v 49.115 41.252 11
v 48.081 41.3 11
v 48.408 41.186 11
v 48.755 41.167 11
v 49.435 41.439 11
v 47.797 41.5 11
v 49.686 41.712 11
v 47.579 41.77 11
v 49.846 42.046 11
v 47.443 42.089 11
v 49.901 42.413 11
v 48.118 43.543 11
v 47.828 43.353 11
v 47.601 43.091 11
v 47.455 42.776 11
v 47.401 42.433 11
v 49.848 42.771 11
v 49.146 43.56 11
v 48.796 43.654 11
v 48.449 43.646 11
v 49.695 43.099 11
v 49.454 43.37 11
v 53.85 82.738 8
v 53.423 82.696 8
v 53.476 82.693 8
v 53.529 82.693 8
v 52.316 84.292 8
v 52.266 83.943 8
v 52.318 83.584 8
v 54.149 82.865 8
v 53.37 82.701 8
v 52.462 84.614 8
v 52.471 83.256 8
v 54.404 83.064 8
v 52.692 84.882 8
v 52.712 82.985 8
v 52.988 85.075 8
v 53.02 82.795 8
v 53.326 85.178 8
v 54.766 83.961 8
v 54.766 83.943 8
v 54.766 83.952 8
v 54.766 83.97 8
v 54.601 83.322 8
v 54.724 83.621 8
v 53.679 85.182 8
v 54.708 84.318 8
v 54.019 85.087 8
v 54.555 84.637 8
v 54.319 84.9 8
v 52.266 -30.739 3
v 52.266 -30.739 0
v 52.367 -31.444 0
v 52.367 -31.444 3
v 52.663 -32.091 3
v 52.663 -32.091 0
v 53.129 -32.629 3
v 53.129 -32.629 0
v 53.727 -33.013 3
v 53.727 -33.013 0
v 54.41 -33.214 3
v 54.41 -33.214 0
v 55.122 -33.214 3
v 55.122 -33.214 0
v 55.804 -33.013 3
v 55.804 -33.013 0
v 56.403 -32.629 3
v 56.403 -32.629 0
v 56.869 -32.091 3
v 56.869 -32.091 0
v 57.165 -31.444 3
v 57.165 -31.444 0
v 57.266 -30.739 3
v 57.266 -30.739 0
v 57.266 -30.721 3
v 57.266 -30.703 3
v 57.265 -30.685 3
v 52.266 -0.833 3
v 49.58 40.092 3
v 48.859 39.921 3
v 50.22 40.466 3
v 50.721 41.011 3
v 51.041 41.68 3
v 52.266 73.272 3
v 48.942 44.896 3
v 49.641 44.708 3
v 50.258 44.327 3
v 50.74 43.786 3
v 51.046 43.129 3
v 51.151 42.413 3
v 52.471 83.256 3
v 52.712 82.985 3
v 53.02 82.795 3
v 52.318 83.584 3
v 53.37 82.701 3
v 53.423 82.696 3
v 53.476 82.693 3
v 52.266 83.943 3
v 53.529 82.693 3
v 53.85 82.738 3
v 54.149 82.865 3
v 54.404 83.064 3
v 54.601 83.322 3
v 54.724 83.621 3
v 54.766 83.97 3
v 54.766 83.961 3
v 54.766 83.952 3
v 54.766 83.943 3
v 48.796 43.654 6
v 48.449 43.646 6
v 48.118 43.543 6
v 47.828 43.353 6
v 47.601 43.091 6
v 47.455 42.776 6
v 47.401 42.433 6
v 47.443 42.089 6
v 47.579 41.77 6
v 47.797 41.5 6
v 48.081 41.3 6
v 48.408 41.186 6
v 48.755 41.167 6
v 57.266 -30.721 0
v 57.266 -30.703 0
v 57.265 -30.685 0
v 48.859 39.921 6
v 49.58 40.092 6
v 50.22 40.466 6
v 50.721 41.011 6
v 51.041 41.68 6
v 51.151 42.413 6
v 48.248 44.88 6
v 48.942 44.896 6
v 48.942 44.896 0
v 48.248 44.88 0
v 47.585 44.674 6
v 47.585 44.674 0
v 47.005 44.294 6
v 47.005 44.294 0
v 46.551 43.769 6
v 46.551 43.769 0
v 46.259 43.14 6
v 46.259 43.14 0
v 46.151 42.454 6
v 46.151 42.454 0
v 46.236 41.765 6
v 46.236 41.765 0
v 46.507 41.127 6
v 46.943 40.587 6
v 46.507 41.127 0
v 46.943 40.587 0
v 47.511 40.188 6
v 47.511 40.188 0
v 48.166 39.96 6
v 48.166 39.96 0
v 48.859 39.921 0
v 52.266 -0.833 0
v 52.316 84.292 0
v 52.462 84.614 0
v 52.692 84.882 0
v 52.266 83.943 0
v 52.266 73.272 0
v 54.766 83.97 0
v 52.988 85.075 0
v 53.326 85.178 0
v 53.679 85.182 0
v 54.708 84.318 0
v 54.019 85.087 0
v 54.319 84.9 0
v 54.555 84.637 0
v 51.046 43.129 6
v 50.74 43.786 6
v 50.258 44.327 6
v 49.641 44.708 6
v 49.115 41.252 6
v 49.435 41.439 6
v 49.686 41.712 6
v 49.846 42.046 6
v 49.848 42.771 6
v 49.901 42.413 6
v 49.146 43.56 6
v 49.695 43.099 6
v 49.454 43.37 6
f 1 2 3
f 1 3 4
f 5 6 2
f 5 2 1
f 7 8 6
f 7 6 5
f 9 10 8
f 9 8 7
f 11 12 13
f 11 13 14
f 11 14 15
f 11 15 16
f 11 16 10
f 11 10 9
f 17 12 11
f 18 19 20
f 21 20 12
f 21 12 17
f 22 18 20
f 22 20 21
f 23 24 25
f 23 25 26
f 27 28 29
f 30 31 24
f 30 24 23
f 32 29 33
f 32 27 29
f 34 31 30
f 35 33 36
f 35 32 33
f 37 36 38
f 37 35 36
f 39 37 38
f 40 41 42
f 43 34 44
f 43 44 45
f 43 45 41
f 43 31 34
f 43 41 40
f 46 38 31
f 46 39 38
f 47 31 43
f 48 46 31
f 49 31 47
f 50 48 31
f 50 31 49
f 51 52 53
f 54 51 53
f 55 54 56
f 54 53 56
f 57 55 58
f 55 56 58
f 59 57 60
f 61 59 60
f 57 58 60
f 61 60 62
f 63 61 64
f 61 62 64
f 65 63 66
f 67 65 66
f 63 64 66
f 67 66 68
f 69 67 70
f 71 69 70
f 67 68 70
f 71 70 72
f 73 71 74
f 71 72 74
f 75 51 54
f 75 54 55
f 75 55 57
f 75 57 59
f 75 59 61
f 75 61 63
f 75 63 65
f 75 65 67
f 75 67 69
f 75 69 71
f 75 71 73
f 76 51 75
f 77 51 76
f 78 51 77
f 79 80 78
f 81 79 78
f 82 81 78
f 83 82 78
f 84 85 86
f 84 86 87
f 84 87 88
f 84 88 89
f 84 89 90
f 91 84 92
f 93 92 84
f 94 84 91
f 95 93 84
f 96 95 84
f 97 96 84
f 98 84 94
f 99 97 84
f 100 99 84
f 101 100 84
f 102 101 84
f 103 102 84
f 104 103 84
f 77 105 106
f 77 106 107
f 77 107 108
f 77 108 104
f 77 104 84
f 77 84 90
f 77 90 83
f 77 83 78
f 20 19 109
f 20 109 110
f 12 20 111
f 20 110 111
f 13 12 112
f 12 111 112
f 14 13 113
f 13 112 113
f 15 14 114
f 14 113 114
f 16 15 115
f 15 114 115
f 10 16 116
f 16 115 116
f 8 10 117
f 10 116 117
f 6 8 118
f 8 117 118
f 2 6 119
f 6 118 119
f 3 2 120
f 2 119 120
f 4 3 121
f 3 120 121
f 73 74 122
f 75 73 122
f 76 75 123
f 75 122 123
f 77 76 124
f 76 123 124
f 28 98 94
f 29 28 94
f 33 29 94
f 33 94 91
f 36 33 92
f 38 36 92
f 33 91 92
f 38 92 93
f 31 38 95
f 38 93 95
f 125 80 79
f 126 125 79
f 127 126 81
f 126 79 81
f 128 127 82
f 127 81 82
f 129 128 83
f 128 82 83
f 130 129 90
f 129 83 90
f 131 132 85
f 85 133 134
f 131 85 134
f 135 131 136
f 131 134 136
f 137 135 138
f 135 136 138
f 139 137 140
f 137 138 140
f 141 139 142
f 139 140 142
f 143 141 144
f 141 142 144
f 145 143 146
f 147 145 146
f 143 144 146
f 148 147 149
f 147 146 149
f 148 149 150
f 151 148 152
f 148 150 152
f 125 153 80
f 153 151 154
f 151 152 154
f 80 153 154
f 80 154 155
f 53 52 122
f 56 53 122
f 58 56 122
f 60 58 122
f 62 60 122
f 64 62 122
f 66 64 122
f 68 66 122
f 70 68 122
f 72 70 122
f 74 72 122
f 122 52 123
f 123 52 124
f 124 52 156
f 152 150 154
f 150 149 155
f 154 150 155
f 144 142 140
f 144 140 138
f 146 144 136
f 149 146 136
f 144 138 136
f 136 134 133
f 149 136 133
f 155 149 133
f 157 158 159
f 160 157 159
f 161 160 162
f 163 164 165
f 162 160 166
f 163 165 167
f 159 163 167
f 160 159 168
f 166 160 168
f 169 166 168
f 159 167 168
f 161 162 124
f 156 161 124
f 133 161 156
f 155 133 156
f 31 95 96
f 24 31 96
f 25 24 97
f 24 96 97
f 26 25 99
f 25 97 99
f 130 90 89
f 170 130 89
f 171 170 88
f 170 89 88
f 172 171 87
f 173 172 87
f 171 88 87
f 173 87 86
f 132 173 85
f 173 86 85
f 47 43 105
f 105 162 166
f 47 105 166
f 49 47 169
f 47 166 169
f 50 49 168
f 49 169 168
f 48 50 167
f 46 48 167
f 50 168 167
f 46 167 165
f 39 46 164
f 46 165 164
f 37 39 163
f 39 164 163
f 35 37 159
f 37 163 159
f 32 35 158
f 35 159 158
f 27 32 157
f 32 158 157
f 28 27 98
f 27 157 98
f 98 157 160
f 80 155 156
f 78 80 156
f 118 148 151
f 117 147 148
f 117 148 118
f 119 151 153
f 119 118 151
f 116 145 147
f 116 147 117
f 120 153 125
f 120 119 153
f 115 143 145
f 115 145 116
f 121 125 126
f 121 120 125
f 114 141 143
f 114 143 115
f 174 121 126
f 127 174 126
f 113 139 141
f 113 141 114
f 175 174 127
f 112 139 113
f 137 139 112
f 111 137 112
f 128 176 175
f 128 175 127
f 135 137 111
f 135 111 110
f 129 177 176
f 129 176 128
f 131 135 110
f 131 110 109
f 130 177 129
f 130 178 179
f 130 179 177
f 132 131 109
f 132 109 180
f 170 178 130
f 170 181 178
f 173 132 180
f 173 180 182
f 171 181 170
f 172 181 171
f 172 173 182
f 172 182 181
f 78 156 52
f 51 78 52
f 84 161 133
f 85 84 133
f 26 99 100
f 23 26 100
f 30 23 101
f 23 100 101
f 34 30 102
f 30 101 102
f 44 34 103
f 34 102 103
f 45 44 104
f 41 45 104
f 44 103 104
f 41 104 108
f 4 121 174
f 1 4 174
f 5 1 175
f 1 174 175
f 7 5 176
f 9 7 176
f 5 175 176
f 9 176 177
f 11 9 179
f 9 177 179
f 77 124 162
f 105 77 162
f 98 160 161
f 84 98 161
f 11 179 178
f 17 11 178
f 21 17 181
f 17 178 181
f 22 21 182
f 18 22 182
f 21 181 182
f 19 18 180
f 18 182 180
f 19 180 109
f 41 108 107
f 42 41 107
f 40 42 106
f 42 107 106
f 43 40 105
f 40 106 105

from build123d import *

# Parameters (mm, degrees)
F1_DEPTH = 6
F2_DEPTH = 11
F3_DEPTH = 8
F4_DEPTH = 3


# Not quite as in the source:
# - a feature names something its author has since deleted; it is built from what else it names


with BuildPart() as f1:
    # F0 (on Top) → F1 (new body)
    with BuildSketch(Plane.XY):
        with BuildLine():
            Line((48.7961772168, 43.654083433), (48.941615093, 44.8955937326))
            ThreePointArc((48.941615093, 44.8955937326), (46.1510840758, 42.4540888757), (48.8589984809, 39.9212626086))
            Line((48.8589984809, 39.9212626086), (48.7548689108, 41.1669178709))
            ThreePointArc((48.7548689108, 41.1669178709), (47.4009117082, 42.4333310045), (48.7961772168, 43.654083433))
        make_face()
        with BuildLine():
            ThreePointArc((51.1507393406, 42.4125731333), (50.5185173495, 44.0743208005), (48.941615093, 44.8955937326))
            Line((48.941615093, 44.8955937326), (48.7961772168, 43.654083433))
            ThreePointArc((48.7961772168, 43.654083433), (49.5846283451, 43.2434469669), (49.9007393406, 42.4125731333))
            ThreePointArc((49.9007393406, 42.4125731333), (49.5707018297, 41.5663054341), (48.7548689108, 41.1669178709))
            Line((48.7548689108, 41.1669178709), (48.8589984809, 39.9212626086))
            ThreePointArc((48.8589984809, 39.9212626086), (50.4906643188, 40.7200377349), (51.1507393406, 42.4125731333))
        make_face()
    extrude(amount=F1_DEPTH)

    # F0 (on Top) → F2 (join)
    with BuildSketch(Plane.XY):
        with BuildLine():
            ThreePointArc((49.9007393406, 42.4125731333), (49.5846283451, 43.2434469669), (48.7961772168, 43.654083433))
            Line((48.7961772168, 43.654083433), (48.6507393406, 42.4125731333))
            Line((48.6507393406, 42.4125731333), (48.7548689108, 41.1669178709))
            ThreePointArc((48.7548689108, 41.1669178709), (49.5707018297, 41.5663054341), (49.9007393406, 42.4125731333))
        make_face()
        with BuildLine():
            Line((48.6507393406, 42.4125731333), (48.7961772168, 43.654083433))
            ThreePointArc((48.7961772168, 43.654083433), (47.4009117082, 42.4333310045), (48.7548689108, 41.1669178709))
            Line((48.7548689108, 41.1669178709), (48.6507393406, 42.4125731333))
        make_face()
    extrude(amount=F2_DEPTH)



with BuildPart() as f3:
    # F0 (on Top) → F3 (new body)
    with BuildSketch(Plane.XY):
        with BuildLine():
            Line((53.5294346637, 82.6926567151), (53.515810825, 83.9425824693))
            Line((53.515810825, 83.9425824693), (53.3703729488, 82.7010721697))
            ThreePointArc((53.3703729488, 82.7010721697), (53.4497696251, 82.6943282645), (53.5294346637, 82.6926567151))
        make_face()
        with BuildLine():
            Line((53.3703729488, 82.7010721697), (53.515810825, 83.9425824693))
            Line((53.515810825, 83.9425824693), (53.5294346637, 82.6926567151))
            ThreePointArc((53.5294346637, 82.6926567151), (54.4044980024, 83.0635289438), (54.765810825, 83.9425824693))
            ThreePointArc((54.765810825, 83.9425824693), (54.7657365792, 83.9562063081), (54.7655138506, 83.9698285284))
            ThreePointArc((54.7655138506, 83.9698285284), (53.5021869863, 85.1925082235), (52.265810825, 83.9425824693))
            ThreePointArc((52.265810825, 83.9425824693), (52.5819218206, 83.1117086357), (53.3703729488, 82.7010721697))
        make_face()
    extrude(amount=F3_DEPTH)


with BuildPart() as f1_1:
    add(f1.part)

    add(f3.part)  # F4 merges F3
    # F0 (on Top) → F4 (join)
    with BuildSketch(Plane.XY):
        with BuildLine():
            ThreePointArc((54.765810825, 83.9425824693), (54.4044980024, 83.0635289438), (53.5294346637, 82.6926567151))
            Line((53.5294346637, 82.6926567151), (54.7385631476, -28.239428033))
            ThreePointArc((54.7385631476, -28.239428033), (56.5044417212, -28.9428490232), (57.2652168763, -30.6847874233))
            Line((57.2652168763, -30.6847874233), (54.7655138506, 83.9698285284))
            ThreePointArc((54.7655138506, 83.9698285284), (54.7657365792, 83.9562063081), (54.765810825, 83.9425824693))
        make_face()
        with BuildLine():
            Line((54.7385631476, -28.239428033), (53.5294346637, 82.6926567151))
            ThreePointArc((53.5294346637, 82.6926567151), (53.4497696251, 82.6943282645), (53.3703729488, 82.7010721697))
            Line((53.3703729488, 82.7010721697), (52.265810825, 73.2721304859))
            Line((52.265810825, 73.2721304859), (52.265810825, -0.8329027879))
            Line((52.265810825, -0.8329027879), (54.5575516847, -28.2479690167))
            ThreePointArc((54.5575516847, -28.2479690167), (54.6479800039, -28.2420579057), (54.7385631476, -28.239428033))
        make_face()
        with BuildLine():
            Line((52.265810825, 73.2721304859), (53.3703729488, 82.7010721697))
            ThreePointArc((53.3703729488, 82.7010721697), (52.5819218206, 83.1117086357), (52.265810825, 83.9425824693))
            Line((52.265810825, 83.9425824693), (52.265810825, 73.2721304859))
        make_face()
        with BuildLine():
            ThreePointArc((57.2652168763, -30.6847874233), (56.5044417212, -28.9428490232), (54.7385631476, -28.239428033))
            Line((54.7385631476, -28.239428033), (54.765810825, -30.7392795414))
            Line((54.765810825, -30.7392795414), (54.5575516847, -28.2479690167))
            ThreePointArc((54.5575516847, -28.2479690167), (52.9258858468, -29.0467441431), (52.265810825, -30.7392795414))
            ThreePointArc((52.265810825, -30.7392795414), (54.765810825, -33.2392795414), (57.265810825, -30.7392795414))
            ThreePointArc((57.265810825, -30.7392795414), (57.2656623334, -30.712031864), (57.2652168763, -30.6847874233))
        make_face()
        with BuildLine():
            Line((54.765810825, -30.7392795414), (54.7385631476, -28.239428033))
            ThreePointArc((54.7385631476, -28.239428033), (54.6479800039, -28.2420579057), (54.5575516847, -28.2479690167))
            Line((54.5575516847, -28.2479690167), (54.765810825, -30.7392795414))
        make_face()
        with BuildLine():
            Line((52.265810825, -0.8329027879), (52.265810825, 73.2721304859))
            Line((52.265810825, 73.2721304859), (48.941615093, 44.8955937326))
            ThreePointArc((48.941615093, 44.8955937326), (50.5185173495, 44.0743208005), (51.1507393406, 42.4125731333))
            ThreePointArc((51.1507393406, 42.4125731333), (50.4906643188, 40.7200377349), (48.8589984809, 39.9212626086))
            Line((48.8589984809, 39.9212626086), (52.265810825, -0.8329027879))
        make_face()
        with BuildLine():
            ThreePointArc((52.265810825, -30.7392795414), (52.9258858468, -29.0467441431), (54.5575516847, -28.2479690167))
            Line((54.5575516847, -28.2479690167), (52.265810825, -0.8329027879))
            Line((52.265810825, -0.8329027879), (52.265810825, -30.7392795414))
        make_face()
    extrude(amount=F4_DEPTH)


solid = f1_1.part
